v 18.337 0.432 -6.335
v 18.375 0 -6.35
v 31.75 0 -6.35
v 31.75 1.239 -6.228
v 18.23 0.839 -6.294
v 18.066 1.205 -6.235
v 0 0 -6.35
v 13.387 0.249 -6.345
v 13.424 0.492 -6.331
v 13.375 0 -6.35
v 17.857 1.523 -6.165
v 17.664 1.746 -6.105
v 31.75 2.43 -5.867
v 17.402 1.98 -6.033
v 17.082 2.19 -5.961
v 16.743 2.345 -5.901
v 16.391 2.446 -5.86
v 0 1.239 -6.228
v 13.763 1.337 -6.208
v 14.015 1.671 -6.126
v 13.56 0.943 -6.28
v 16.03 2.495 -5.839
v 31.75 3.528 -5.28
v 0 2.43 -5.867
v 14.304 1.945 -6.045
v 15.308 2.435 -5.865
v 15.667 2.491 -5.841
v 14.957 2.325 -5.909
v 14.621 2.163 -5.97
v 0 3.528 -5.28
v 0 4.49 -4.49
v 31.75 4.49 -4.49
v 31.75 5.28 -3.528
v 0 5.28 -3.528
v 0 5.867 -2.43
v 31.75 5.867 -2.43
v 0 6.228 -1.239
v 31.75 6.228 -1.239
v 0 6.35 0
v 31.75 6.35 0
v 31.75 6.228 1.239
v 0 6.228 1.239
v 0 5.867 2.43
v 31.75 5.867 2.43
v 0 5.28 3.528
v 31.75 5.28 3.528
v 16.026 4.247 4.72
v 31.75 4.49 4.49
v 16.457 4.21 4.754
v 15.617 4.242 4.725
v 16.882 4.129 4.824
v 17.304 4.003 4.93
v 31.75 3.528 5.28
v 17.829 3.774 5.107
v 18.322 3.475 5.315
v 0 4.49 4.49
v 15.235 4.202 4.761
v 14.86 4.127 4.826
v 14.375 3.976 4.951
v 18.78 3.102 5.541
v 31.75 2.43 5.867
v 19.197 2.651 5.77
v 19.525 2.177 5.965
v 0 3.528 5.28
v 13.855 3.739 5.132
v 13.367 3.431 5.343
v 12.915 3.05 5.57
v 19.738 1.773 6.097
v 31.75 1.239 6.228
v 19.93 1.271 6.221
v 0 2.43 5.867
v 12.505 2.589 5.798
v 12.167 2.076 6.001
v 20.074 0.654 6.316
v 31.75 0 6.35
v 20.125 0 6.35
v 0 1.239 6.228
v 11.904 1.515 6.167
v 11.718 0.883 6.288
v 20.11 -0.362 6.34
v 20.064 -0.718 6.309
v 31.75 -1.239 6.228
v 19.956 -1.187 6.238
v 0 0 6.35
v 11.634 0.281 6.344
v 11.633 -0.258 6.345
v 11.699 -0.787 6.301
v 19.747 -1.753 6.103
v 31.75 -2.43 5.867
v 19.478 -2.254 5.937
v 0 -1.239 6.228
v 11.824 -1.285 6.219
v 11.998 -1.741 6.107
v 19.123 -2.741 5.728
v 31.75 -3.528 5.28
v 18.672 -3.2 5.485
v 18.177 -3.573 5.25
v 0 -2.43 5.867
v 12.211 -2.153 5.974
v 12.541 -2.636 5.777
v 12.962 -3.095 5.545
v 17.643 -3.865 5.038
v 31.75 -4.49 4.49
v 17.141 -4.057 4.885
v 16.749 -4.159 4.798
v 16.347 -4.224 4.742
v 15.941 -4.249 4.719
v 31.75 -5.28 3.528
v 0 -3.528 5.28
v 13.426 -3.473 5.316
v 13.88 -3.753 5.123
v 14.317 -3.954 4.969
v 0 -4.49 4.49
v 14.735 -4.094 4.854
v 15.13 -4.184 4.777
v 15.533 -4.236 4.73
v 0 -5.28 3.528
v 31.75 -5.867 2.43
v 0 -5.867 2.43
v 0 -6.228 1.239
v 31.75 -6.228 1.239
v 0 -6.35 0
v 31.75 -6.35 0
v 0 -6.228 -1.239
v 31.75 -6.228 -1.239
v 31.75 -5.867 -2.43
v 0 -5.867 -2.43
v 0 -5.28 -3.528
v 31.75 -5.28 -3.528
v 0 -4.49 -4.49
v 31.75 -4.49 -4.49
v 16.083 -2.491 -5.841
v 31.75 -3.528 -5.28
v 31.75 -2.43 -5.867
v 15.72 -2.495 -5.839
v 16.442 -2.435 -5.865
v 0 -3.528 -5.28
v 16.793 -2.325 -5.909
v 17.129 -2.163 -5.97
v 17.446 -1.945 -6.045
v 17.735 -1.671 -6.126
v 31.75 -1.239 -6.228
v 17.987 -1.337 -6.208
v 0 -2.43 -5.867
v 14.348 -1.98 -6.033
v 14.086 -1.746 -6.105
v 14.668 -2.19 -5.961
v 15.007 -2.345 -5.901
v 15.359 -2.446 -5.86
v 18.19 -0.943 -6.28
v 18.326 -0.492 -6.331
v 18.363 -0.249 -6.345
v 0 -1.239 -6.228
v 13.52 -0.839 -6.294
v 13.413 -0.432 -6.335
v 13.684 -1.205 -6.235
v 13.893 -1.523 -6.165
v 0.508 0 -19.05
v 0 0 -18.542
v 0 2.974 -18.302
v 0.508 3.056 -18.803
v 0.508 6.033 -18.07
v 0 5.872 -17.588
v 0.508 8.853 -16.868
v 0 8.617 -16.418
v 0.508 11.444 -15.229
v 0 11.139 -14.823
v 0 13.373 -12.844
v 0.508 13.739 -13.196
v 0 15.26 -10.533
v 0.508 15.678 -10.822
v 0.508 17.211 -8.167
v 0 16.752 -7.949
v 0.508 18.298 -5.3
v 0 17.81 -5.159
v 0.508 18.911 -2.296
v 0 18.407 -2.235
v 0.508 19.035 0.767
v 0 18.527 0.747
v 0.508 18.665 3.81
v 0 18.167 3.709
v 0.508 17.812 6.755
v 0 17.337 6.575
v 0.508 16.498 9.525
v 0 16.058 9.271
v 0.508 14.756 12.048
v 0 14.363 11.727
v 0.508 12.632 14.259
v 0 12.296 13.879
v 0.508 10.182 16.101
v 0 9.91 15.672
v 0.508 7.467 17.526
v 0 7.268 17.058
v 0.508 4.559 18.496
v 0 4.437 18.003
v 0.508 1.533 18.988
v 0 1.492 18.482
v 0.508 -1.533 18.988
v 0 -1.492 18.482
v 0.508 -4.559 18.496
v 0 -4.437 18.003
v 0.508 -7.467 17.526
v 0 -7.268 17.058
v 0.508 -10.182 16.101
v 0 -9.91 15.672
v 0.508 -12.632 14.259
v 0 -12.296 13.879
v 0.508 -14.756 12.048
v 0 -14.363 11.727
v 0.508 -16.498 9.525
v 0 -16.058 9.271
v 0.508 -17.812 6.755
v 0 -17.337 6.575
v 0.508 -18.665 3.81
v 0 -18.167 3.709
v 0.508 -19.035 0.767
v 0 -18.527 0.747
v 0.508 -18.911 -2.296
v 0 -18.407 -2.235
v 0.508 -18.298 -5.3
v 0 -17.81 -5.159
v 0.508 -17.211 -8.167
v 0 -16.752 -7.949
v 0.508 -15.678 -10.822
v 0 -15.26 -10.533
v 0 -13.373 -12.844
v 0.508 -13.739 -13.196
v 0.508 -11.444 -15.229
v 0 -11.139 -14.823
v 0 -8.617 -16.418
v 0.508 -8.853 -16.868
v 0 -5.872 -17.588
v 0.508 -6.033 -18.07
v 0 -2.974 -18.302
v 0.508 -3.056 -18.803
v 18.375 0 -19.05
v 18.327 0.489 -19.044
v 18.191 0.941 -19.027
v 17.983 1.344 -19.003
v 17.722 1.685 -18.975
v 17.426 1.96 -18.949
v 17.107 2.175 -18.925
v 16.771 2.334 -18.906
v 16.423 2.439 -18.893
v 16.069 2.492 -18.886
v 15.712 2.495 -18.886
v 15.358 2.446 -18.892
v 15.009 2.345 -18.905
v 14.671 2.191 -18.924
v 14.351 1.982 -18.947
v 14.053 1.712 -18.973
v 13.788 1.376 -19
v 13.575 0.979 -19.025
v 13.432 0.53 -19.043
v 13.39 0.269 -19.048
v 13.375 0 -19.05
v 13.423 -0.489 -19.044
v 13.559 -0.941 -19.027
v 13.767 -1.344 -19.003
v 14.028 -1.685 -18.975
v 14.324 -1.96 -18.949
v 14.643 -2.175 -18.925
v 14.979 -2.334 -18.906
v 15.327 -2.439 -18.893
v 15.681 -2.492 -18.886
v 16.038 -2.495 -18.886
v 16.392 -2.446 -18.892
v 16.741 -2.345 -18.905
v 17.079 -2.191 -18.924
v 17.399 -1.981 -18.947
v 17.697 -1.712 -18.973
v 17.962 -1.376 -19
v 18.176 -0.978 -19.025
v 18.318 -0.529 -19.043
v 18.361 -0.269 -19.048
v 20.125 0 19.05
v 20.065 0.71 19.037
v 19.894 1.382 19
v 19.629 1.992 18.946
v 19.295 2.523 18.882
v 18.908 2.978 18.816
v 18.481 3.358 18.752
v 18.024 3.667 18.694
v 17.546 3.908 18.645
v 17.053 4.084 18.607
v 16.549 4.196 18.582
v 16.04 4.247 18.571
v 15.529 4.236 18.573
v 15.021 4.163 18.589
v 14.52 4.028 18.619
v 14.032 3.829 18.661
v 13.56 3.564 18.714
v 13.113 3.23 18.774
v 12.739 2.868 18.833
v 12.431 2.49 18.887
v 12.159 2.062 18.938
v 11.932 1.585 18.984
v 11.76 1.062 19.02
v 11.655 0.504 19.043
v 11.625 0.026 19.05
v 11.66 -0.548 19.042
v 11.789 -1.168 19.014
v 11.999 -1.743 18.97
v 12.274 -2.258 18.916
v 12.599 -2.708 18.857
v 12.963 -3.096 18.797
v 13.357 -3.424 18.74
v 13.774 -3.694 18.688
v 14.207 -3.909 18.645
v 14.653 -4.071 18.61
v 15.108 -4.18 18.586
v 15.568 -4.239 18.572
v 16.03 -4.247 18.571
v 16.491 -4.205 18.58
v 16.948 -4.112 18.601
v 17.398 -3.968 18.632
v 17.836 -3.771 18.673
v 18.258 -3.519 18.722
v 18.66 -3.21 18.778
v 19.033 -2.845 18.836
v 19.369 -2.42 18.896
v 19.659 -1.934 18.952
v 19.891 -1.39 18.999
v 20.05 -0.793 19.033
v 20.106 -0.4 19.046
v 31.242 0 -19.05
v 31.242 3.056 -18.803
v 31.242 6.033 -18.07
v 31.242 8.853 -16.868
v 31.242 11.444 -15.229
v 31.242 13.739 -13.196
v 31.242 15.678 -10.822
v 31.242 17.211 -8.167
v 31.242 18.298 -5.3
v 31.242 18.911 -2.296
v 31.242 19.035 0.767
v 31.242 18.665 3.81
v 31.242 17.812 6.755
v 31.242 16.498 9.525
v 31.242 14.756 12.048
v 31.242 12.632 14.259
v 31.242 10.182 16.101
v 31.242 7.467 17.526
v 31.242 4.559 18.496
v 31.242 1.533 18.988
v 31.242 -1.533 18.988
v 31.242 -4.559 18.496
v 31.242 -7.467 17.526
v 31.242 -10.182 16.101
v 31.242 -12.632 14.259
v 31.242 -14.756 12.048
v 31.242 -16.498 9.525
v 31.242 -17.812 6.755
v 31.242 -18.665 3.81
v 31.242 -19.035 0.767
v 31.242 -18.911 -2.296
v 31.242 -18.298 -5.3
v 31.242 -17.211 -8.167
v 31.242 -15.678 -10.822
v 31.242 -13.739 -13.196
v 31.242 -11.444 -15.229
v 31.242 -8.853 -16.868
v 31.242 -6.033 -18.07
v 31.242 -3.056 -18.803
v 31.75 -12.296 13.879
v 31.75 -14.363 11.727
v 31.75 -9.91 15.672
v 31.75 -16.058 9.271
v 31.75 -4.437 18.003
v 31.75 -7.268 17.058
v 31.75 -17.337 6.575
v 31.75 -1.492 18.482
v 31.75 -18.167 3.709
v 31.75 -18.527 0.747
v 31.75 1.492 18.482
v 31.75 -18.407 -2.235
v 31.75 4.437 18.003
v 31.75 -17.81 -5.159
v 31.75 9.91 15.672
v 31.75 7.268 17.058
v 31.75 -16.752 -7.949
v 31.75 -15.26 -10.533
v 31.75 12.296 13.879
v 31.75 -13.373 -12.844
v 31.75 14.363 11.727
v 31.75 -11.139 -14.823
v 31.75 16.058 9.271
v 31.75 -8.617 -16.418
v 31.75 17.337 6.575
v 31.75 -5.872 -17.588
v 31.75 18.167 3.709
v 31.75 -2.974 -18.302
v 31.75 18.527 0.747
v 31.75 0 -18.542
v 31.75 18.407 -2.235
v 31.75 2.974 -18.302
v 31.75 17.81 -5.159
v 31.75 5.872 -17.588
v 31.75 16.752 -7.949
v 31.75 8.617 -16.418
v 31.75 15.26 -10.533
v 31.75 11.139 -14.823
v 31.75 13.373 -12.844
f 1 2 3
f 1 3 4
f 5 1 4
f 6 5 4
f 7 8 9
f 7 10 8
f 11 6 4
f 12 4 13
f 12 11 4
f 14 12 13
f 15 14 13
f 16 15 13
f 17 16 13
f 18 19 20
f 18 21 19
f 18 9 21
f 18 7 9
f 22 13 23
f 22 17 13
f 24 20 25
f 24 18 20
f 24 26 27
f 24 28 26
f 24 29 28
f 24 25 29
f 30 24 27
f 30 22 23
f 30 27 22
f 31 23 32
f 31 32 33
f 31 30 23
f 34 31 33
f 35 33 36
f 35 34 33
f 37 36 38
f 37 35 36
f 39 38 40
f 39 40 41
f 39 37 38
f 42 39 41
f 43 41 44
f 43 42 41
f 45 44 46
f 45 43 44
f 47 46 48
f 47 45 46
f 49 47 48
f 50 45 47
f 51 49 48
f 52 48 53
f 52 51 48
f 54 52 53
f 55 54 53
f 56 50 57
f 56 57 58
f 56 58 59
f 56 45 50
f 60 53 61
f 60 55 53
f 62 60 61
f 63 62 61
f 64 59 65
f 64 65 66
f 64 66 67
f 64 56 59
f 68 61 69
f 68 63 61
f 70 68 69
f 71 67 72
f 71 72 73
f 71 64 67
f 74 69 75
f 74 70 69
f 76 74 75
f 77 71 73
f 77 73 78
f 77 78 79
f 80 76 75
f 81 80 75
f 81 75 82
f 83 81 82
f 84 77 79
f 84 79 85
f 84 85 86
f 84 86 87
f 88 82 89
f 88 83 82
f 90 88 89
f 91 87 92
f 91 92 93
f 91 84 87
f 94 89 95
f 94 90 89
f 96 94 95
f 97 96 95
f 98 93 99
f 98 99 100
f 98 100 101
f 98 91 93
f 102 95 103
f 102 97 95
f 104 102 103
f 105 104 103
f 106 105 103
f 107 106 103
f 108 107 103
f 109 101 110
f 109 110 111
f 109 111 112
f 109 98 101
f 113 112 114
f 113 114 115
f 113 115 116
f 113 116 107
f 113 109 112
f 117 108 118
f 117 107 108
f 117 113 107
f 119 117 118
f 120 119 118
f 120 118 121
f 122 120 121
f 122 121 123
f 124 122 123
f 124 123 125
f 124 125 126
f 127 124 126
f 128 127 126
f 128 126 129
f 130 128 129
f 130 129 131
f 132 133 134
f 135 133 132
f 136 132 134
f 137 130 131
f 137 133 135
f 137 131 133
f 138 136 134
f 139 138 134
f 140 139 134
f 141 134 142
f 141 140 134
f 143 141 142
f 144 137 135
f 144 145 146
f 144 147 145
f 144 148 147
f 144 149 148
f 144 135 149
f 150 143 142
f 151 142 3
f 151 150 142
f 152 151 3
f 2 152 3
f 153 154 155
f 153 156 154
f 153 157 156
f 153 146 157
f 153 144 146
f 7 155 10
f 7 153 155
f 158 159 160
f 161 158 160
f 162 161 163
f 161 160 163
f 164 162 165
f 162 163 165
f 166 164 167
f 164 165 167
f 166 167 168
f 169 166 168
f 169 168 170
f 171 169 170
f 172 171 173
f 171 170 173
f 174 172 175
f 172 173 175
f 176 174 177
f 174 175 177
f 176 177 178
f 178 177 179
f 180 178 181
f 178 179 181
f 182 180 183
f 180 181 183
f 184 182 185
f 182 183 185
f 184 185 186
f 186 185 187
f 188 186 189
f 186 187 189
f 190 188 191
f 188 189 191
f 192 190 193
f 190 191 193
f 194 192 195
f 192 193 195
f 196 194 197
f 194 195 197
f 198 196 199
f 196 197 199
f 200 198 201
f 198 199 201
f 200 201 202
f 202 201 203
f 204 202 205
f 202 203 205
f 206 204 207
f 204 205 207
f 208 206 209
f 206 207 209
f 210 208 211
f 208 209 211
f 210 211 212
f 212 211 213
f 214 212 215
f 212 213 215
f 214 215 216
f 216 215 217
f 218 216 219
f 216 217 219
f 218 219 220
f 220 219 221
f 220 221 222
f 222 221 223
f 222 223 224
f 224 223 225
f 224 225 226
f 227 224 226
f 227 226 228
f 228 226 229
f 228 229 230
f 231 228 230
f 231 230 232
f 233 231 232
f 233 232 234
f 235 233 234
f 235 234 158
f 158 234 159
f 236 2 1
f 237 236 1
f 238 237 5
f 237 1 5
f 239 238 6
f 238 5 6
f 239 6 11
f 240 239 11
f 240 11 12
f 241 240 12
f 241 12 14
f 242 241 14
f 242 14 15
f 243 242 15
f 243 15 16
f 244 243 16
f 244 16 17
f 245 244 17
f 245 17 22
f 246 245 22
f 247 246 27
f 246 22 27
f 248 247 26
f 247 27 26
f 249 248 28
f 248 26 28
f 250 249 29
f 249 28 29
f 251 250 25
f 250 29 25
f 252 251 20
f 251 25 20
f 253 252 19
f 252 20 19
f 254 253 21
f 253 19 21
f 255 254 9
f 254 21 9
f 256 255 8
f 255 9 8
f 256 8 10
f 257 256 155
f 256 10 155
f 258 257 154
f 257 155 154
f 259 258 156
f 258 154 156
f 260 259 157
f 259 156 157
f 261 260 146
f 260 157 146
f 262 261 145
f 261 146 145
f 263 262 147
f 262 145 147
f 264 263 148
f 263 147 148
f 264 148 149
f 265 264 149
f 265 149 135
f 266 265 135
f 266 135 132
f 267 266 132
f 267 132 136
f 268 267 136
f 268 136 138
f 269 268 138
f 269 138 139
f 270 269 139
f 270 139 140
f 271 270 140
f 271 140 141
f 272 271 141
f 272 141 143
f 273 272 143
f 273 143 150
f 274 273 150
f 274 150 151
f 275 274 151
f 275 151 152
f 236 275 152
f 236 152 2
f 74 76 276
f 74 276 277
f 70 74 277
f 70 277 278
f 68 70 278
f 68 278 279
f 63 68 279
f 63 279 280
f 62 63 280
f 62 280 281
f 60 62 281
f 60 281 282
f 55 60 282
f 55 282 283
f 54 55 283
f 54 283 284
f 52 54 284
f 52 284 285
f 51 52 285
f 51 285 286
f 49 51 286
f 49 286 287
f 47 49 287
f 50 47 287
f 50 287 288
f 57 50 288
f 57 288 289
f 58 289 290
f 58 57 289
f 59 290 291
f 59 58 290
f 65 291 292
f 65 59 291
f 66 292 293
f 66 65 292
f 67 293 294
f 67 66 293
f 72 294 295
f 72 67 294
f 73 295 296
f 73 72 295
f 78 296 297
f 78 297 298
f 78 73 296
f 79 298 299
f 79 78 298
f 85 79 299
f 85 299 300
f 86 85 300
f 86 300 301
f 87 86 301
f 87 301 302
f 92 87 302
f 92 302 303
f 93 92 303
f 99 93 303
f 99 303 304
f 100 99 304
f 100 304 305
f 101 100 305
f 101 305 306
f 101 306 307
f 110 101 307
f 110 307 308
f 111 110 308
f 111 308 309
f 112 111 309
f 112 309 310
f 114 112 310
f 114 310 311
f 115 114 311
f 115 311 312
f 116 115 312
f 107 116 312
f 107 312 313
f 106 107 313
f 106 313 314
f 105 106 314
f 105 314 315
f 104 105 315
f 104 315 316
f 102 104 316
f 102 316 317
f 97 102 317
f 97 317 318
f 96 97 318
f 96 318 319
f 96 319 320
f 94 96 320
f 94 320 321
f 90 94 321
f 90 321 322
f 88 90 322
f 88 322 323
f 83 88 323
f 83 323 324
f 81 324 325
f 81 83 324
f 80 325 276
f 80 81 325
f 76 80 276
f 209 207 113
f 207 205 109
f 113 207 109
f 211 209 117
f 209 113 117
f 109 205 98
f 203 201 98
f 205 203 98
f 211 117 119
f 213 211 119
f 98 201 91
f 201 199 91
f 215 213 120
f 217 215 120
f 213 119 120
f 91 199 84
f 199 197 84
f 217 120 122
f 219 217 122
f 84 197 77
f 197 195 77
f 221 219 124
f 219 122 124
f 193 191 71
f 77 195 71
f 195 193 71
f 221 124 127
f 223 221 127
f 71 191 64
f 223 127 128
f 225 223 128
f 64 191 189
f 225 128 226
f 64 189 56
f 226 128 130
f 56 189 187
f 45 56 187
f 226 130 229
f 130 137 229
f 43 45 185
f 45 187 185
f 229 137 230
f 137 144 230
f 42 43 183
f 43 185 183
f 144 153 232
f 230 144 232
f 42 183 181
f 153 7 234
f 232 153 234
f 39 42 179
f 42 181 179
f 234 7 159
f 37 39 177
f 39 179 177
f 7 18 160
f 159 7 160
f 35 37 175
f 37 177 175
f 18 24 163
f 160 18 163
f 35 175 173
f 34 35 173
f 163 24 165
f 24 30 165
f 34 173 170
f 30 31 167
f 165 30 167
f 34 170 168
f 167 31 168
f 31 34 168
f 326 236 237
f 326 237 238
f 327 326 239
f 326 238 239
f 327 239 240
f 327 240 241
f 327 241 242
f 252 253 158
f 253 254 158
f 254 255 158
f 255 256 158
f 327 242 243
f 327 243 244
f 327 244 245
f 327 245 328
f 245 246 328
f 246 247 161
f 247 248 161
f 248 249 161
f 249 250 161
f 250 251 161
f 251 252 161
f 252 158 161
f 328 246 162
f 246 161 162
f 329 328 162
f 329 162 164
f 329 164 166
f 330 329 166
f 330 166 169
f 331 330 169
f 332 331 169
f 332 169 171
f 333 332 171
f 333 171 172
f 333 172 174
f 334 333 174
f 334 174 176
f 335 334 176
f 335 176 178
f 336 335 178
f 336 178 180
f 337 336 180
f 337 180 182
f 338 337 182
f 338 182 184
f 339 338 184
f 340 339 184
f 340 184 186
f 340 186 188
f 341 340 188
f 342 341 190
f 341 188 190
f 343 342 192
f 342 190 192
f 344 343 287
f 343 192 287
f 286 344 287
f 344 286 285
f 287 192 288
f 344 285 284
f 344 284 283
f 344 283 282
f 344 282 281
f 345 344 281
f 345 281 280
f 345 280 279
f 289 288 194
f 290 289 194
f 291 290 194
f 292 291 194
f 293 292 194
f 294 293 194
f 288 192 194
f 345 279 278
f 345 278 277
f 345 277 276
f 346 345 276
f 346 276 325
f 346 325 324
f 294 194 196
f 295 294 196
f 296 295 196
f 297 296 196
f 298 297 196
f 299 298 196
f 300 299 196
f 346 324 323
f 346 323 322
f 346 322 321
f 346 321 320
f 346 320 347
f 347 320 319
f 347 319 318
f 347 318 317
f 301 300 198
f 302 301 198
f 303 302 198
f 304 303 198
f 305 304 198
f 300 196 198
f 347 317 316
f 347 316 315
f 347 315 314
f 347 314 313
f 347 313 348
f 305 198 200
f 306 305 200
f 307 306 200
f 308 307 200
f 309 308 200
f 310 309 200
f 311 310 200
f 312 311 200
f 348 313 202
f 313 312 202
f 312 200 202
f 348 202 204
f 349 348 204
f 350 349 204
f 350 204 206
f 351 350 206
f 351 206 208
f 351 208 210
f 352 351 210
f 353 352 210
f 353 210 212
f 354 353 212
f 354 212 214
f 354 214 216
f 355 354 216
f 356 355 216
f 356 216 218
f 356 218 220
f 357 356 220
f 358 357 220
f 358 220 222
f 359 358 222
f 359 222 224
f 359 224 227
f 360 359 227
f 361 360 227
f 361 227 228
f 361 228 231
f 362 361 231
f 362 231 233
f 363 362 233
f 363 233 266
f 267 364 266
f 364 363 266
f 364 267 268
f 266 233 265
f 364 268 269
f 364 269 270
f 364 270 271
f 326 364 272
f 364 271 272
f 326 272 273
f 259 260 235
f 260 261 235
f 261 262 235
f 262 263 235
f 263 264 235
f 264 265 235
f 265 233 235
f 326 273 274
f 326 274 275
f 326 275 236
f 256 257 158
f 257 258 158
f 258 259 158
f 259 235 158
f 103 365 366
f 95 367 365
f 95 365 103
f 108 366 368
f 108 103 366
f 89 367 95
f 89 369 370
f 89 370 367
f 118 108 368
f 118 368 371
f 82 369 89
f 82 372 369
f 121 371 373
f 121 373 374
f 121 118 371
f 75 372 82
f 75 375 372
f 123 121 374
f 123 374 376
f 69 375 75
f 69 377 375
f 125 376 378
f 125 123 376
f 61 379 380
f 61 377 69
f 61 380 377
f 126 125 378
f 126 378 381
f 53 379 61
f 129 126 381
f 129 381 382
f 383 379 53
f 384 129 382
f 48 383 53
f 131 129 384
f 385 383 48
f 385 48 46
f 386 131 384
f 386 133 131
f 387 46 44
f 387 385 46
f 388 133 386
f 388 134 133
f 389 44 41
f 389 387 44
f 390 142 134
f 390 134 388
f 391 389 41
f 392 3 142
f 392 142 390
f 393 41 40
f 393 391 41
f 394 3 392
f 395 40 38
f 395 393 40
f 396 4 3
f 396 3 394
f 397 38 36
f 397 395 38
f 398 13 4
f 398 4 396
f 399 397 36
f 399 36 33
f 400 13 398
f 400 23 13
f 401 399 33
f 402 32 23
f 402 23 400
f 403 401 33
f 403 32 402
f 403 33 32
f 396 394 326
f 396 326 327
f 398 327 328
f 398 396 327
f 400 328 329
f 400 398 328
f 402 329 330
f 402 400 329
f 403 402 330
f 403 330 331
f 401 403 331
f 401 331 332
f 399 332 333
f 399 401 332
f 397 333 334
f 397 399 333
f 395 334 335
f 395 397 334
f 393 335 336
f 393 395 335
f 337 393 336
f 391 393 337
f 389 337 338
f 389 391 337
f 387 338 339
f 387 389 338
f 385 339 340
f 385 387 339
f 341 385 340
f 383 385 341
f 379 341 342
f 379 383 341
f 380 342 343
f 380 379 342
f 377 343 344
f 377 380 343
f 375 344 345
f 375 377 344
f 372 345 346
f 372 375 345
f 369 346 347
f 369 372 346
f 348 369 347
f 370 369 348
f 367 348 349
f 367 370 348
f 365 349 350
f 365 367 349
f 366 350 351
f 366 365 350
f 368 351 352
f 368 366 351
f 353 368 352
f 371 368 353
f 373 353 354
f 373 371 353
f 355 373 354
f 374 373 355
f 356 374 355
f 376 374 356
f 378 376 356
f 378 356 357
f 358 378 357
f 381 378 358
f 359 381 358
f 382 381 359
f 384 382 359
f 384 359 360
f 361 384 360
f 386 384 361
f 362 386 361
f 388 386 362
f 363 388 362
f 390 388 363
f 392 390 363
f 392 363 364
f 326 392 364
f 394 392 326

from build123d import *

# Parameters (mm, degrees)
SKETCH1_R           = 19.05
SKETCH1_R_2         = 6.35
BOSS_EXTRUDE1_DEPTH = 31.75
SKETCH2_R           = 4.25
CUT_EXTRUDE1_DEPTH  = 20.05
SKETCH2_6_R         = 2.5
CUT_EXTRUDE3_DEPTH  = 20.0500001
CHAMFER1_SIZE       = 0.508


with BuildPart() as part:
    # Sketch1 → Boss-Extrude1 (new body)
    with BuildSketch(Plane(origin=(0, 0, 0), x_dir=(0, 0, -1), z_dir=(1, 0, 0))):
        Circle(SKETCH1_R)
        Circle(SKETCH1_R_2, mode=Mode.SUBTRACT)
    extrude(amount=BOSS_EXTRUDE1_DEPTH)

    # Sketch2 → Cut-Extrude1 (cut, through all)
    with BuildSketch(Plane.XY):
        with Locations((15.875, 0)):
            Circle(SKETCH2_R)
    extrude(amount=CUT_EXTRUDE1_DEPTH, mode=Mode.SUBTRACT)

    # Sketch2<6> → Cut-Extrude3 (cut, through all)
    with BuildSketch(Plane.XY):
        with Locations((15.875, 0)):
            Circle(SKETCH2_6_R)
    extrude(amount=-CUT_EXTRUDE3_DEPTH, mode=Mode.SUBTRACT)

    # Chamfer1
    chamfer1_edges = [part.edges().sort_by_distance(p)[0] for p in [
        (0, 0, 19.05),
        (31.75, 0, 19.05),
    ]]
    chamfer(chamfer1_edges, length=CHAMFER1_SIZE)


solid = part.part
